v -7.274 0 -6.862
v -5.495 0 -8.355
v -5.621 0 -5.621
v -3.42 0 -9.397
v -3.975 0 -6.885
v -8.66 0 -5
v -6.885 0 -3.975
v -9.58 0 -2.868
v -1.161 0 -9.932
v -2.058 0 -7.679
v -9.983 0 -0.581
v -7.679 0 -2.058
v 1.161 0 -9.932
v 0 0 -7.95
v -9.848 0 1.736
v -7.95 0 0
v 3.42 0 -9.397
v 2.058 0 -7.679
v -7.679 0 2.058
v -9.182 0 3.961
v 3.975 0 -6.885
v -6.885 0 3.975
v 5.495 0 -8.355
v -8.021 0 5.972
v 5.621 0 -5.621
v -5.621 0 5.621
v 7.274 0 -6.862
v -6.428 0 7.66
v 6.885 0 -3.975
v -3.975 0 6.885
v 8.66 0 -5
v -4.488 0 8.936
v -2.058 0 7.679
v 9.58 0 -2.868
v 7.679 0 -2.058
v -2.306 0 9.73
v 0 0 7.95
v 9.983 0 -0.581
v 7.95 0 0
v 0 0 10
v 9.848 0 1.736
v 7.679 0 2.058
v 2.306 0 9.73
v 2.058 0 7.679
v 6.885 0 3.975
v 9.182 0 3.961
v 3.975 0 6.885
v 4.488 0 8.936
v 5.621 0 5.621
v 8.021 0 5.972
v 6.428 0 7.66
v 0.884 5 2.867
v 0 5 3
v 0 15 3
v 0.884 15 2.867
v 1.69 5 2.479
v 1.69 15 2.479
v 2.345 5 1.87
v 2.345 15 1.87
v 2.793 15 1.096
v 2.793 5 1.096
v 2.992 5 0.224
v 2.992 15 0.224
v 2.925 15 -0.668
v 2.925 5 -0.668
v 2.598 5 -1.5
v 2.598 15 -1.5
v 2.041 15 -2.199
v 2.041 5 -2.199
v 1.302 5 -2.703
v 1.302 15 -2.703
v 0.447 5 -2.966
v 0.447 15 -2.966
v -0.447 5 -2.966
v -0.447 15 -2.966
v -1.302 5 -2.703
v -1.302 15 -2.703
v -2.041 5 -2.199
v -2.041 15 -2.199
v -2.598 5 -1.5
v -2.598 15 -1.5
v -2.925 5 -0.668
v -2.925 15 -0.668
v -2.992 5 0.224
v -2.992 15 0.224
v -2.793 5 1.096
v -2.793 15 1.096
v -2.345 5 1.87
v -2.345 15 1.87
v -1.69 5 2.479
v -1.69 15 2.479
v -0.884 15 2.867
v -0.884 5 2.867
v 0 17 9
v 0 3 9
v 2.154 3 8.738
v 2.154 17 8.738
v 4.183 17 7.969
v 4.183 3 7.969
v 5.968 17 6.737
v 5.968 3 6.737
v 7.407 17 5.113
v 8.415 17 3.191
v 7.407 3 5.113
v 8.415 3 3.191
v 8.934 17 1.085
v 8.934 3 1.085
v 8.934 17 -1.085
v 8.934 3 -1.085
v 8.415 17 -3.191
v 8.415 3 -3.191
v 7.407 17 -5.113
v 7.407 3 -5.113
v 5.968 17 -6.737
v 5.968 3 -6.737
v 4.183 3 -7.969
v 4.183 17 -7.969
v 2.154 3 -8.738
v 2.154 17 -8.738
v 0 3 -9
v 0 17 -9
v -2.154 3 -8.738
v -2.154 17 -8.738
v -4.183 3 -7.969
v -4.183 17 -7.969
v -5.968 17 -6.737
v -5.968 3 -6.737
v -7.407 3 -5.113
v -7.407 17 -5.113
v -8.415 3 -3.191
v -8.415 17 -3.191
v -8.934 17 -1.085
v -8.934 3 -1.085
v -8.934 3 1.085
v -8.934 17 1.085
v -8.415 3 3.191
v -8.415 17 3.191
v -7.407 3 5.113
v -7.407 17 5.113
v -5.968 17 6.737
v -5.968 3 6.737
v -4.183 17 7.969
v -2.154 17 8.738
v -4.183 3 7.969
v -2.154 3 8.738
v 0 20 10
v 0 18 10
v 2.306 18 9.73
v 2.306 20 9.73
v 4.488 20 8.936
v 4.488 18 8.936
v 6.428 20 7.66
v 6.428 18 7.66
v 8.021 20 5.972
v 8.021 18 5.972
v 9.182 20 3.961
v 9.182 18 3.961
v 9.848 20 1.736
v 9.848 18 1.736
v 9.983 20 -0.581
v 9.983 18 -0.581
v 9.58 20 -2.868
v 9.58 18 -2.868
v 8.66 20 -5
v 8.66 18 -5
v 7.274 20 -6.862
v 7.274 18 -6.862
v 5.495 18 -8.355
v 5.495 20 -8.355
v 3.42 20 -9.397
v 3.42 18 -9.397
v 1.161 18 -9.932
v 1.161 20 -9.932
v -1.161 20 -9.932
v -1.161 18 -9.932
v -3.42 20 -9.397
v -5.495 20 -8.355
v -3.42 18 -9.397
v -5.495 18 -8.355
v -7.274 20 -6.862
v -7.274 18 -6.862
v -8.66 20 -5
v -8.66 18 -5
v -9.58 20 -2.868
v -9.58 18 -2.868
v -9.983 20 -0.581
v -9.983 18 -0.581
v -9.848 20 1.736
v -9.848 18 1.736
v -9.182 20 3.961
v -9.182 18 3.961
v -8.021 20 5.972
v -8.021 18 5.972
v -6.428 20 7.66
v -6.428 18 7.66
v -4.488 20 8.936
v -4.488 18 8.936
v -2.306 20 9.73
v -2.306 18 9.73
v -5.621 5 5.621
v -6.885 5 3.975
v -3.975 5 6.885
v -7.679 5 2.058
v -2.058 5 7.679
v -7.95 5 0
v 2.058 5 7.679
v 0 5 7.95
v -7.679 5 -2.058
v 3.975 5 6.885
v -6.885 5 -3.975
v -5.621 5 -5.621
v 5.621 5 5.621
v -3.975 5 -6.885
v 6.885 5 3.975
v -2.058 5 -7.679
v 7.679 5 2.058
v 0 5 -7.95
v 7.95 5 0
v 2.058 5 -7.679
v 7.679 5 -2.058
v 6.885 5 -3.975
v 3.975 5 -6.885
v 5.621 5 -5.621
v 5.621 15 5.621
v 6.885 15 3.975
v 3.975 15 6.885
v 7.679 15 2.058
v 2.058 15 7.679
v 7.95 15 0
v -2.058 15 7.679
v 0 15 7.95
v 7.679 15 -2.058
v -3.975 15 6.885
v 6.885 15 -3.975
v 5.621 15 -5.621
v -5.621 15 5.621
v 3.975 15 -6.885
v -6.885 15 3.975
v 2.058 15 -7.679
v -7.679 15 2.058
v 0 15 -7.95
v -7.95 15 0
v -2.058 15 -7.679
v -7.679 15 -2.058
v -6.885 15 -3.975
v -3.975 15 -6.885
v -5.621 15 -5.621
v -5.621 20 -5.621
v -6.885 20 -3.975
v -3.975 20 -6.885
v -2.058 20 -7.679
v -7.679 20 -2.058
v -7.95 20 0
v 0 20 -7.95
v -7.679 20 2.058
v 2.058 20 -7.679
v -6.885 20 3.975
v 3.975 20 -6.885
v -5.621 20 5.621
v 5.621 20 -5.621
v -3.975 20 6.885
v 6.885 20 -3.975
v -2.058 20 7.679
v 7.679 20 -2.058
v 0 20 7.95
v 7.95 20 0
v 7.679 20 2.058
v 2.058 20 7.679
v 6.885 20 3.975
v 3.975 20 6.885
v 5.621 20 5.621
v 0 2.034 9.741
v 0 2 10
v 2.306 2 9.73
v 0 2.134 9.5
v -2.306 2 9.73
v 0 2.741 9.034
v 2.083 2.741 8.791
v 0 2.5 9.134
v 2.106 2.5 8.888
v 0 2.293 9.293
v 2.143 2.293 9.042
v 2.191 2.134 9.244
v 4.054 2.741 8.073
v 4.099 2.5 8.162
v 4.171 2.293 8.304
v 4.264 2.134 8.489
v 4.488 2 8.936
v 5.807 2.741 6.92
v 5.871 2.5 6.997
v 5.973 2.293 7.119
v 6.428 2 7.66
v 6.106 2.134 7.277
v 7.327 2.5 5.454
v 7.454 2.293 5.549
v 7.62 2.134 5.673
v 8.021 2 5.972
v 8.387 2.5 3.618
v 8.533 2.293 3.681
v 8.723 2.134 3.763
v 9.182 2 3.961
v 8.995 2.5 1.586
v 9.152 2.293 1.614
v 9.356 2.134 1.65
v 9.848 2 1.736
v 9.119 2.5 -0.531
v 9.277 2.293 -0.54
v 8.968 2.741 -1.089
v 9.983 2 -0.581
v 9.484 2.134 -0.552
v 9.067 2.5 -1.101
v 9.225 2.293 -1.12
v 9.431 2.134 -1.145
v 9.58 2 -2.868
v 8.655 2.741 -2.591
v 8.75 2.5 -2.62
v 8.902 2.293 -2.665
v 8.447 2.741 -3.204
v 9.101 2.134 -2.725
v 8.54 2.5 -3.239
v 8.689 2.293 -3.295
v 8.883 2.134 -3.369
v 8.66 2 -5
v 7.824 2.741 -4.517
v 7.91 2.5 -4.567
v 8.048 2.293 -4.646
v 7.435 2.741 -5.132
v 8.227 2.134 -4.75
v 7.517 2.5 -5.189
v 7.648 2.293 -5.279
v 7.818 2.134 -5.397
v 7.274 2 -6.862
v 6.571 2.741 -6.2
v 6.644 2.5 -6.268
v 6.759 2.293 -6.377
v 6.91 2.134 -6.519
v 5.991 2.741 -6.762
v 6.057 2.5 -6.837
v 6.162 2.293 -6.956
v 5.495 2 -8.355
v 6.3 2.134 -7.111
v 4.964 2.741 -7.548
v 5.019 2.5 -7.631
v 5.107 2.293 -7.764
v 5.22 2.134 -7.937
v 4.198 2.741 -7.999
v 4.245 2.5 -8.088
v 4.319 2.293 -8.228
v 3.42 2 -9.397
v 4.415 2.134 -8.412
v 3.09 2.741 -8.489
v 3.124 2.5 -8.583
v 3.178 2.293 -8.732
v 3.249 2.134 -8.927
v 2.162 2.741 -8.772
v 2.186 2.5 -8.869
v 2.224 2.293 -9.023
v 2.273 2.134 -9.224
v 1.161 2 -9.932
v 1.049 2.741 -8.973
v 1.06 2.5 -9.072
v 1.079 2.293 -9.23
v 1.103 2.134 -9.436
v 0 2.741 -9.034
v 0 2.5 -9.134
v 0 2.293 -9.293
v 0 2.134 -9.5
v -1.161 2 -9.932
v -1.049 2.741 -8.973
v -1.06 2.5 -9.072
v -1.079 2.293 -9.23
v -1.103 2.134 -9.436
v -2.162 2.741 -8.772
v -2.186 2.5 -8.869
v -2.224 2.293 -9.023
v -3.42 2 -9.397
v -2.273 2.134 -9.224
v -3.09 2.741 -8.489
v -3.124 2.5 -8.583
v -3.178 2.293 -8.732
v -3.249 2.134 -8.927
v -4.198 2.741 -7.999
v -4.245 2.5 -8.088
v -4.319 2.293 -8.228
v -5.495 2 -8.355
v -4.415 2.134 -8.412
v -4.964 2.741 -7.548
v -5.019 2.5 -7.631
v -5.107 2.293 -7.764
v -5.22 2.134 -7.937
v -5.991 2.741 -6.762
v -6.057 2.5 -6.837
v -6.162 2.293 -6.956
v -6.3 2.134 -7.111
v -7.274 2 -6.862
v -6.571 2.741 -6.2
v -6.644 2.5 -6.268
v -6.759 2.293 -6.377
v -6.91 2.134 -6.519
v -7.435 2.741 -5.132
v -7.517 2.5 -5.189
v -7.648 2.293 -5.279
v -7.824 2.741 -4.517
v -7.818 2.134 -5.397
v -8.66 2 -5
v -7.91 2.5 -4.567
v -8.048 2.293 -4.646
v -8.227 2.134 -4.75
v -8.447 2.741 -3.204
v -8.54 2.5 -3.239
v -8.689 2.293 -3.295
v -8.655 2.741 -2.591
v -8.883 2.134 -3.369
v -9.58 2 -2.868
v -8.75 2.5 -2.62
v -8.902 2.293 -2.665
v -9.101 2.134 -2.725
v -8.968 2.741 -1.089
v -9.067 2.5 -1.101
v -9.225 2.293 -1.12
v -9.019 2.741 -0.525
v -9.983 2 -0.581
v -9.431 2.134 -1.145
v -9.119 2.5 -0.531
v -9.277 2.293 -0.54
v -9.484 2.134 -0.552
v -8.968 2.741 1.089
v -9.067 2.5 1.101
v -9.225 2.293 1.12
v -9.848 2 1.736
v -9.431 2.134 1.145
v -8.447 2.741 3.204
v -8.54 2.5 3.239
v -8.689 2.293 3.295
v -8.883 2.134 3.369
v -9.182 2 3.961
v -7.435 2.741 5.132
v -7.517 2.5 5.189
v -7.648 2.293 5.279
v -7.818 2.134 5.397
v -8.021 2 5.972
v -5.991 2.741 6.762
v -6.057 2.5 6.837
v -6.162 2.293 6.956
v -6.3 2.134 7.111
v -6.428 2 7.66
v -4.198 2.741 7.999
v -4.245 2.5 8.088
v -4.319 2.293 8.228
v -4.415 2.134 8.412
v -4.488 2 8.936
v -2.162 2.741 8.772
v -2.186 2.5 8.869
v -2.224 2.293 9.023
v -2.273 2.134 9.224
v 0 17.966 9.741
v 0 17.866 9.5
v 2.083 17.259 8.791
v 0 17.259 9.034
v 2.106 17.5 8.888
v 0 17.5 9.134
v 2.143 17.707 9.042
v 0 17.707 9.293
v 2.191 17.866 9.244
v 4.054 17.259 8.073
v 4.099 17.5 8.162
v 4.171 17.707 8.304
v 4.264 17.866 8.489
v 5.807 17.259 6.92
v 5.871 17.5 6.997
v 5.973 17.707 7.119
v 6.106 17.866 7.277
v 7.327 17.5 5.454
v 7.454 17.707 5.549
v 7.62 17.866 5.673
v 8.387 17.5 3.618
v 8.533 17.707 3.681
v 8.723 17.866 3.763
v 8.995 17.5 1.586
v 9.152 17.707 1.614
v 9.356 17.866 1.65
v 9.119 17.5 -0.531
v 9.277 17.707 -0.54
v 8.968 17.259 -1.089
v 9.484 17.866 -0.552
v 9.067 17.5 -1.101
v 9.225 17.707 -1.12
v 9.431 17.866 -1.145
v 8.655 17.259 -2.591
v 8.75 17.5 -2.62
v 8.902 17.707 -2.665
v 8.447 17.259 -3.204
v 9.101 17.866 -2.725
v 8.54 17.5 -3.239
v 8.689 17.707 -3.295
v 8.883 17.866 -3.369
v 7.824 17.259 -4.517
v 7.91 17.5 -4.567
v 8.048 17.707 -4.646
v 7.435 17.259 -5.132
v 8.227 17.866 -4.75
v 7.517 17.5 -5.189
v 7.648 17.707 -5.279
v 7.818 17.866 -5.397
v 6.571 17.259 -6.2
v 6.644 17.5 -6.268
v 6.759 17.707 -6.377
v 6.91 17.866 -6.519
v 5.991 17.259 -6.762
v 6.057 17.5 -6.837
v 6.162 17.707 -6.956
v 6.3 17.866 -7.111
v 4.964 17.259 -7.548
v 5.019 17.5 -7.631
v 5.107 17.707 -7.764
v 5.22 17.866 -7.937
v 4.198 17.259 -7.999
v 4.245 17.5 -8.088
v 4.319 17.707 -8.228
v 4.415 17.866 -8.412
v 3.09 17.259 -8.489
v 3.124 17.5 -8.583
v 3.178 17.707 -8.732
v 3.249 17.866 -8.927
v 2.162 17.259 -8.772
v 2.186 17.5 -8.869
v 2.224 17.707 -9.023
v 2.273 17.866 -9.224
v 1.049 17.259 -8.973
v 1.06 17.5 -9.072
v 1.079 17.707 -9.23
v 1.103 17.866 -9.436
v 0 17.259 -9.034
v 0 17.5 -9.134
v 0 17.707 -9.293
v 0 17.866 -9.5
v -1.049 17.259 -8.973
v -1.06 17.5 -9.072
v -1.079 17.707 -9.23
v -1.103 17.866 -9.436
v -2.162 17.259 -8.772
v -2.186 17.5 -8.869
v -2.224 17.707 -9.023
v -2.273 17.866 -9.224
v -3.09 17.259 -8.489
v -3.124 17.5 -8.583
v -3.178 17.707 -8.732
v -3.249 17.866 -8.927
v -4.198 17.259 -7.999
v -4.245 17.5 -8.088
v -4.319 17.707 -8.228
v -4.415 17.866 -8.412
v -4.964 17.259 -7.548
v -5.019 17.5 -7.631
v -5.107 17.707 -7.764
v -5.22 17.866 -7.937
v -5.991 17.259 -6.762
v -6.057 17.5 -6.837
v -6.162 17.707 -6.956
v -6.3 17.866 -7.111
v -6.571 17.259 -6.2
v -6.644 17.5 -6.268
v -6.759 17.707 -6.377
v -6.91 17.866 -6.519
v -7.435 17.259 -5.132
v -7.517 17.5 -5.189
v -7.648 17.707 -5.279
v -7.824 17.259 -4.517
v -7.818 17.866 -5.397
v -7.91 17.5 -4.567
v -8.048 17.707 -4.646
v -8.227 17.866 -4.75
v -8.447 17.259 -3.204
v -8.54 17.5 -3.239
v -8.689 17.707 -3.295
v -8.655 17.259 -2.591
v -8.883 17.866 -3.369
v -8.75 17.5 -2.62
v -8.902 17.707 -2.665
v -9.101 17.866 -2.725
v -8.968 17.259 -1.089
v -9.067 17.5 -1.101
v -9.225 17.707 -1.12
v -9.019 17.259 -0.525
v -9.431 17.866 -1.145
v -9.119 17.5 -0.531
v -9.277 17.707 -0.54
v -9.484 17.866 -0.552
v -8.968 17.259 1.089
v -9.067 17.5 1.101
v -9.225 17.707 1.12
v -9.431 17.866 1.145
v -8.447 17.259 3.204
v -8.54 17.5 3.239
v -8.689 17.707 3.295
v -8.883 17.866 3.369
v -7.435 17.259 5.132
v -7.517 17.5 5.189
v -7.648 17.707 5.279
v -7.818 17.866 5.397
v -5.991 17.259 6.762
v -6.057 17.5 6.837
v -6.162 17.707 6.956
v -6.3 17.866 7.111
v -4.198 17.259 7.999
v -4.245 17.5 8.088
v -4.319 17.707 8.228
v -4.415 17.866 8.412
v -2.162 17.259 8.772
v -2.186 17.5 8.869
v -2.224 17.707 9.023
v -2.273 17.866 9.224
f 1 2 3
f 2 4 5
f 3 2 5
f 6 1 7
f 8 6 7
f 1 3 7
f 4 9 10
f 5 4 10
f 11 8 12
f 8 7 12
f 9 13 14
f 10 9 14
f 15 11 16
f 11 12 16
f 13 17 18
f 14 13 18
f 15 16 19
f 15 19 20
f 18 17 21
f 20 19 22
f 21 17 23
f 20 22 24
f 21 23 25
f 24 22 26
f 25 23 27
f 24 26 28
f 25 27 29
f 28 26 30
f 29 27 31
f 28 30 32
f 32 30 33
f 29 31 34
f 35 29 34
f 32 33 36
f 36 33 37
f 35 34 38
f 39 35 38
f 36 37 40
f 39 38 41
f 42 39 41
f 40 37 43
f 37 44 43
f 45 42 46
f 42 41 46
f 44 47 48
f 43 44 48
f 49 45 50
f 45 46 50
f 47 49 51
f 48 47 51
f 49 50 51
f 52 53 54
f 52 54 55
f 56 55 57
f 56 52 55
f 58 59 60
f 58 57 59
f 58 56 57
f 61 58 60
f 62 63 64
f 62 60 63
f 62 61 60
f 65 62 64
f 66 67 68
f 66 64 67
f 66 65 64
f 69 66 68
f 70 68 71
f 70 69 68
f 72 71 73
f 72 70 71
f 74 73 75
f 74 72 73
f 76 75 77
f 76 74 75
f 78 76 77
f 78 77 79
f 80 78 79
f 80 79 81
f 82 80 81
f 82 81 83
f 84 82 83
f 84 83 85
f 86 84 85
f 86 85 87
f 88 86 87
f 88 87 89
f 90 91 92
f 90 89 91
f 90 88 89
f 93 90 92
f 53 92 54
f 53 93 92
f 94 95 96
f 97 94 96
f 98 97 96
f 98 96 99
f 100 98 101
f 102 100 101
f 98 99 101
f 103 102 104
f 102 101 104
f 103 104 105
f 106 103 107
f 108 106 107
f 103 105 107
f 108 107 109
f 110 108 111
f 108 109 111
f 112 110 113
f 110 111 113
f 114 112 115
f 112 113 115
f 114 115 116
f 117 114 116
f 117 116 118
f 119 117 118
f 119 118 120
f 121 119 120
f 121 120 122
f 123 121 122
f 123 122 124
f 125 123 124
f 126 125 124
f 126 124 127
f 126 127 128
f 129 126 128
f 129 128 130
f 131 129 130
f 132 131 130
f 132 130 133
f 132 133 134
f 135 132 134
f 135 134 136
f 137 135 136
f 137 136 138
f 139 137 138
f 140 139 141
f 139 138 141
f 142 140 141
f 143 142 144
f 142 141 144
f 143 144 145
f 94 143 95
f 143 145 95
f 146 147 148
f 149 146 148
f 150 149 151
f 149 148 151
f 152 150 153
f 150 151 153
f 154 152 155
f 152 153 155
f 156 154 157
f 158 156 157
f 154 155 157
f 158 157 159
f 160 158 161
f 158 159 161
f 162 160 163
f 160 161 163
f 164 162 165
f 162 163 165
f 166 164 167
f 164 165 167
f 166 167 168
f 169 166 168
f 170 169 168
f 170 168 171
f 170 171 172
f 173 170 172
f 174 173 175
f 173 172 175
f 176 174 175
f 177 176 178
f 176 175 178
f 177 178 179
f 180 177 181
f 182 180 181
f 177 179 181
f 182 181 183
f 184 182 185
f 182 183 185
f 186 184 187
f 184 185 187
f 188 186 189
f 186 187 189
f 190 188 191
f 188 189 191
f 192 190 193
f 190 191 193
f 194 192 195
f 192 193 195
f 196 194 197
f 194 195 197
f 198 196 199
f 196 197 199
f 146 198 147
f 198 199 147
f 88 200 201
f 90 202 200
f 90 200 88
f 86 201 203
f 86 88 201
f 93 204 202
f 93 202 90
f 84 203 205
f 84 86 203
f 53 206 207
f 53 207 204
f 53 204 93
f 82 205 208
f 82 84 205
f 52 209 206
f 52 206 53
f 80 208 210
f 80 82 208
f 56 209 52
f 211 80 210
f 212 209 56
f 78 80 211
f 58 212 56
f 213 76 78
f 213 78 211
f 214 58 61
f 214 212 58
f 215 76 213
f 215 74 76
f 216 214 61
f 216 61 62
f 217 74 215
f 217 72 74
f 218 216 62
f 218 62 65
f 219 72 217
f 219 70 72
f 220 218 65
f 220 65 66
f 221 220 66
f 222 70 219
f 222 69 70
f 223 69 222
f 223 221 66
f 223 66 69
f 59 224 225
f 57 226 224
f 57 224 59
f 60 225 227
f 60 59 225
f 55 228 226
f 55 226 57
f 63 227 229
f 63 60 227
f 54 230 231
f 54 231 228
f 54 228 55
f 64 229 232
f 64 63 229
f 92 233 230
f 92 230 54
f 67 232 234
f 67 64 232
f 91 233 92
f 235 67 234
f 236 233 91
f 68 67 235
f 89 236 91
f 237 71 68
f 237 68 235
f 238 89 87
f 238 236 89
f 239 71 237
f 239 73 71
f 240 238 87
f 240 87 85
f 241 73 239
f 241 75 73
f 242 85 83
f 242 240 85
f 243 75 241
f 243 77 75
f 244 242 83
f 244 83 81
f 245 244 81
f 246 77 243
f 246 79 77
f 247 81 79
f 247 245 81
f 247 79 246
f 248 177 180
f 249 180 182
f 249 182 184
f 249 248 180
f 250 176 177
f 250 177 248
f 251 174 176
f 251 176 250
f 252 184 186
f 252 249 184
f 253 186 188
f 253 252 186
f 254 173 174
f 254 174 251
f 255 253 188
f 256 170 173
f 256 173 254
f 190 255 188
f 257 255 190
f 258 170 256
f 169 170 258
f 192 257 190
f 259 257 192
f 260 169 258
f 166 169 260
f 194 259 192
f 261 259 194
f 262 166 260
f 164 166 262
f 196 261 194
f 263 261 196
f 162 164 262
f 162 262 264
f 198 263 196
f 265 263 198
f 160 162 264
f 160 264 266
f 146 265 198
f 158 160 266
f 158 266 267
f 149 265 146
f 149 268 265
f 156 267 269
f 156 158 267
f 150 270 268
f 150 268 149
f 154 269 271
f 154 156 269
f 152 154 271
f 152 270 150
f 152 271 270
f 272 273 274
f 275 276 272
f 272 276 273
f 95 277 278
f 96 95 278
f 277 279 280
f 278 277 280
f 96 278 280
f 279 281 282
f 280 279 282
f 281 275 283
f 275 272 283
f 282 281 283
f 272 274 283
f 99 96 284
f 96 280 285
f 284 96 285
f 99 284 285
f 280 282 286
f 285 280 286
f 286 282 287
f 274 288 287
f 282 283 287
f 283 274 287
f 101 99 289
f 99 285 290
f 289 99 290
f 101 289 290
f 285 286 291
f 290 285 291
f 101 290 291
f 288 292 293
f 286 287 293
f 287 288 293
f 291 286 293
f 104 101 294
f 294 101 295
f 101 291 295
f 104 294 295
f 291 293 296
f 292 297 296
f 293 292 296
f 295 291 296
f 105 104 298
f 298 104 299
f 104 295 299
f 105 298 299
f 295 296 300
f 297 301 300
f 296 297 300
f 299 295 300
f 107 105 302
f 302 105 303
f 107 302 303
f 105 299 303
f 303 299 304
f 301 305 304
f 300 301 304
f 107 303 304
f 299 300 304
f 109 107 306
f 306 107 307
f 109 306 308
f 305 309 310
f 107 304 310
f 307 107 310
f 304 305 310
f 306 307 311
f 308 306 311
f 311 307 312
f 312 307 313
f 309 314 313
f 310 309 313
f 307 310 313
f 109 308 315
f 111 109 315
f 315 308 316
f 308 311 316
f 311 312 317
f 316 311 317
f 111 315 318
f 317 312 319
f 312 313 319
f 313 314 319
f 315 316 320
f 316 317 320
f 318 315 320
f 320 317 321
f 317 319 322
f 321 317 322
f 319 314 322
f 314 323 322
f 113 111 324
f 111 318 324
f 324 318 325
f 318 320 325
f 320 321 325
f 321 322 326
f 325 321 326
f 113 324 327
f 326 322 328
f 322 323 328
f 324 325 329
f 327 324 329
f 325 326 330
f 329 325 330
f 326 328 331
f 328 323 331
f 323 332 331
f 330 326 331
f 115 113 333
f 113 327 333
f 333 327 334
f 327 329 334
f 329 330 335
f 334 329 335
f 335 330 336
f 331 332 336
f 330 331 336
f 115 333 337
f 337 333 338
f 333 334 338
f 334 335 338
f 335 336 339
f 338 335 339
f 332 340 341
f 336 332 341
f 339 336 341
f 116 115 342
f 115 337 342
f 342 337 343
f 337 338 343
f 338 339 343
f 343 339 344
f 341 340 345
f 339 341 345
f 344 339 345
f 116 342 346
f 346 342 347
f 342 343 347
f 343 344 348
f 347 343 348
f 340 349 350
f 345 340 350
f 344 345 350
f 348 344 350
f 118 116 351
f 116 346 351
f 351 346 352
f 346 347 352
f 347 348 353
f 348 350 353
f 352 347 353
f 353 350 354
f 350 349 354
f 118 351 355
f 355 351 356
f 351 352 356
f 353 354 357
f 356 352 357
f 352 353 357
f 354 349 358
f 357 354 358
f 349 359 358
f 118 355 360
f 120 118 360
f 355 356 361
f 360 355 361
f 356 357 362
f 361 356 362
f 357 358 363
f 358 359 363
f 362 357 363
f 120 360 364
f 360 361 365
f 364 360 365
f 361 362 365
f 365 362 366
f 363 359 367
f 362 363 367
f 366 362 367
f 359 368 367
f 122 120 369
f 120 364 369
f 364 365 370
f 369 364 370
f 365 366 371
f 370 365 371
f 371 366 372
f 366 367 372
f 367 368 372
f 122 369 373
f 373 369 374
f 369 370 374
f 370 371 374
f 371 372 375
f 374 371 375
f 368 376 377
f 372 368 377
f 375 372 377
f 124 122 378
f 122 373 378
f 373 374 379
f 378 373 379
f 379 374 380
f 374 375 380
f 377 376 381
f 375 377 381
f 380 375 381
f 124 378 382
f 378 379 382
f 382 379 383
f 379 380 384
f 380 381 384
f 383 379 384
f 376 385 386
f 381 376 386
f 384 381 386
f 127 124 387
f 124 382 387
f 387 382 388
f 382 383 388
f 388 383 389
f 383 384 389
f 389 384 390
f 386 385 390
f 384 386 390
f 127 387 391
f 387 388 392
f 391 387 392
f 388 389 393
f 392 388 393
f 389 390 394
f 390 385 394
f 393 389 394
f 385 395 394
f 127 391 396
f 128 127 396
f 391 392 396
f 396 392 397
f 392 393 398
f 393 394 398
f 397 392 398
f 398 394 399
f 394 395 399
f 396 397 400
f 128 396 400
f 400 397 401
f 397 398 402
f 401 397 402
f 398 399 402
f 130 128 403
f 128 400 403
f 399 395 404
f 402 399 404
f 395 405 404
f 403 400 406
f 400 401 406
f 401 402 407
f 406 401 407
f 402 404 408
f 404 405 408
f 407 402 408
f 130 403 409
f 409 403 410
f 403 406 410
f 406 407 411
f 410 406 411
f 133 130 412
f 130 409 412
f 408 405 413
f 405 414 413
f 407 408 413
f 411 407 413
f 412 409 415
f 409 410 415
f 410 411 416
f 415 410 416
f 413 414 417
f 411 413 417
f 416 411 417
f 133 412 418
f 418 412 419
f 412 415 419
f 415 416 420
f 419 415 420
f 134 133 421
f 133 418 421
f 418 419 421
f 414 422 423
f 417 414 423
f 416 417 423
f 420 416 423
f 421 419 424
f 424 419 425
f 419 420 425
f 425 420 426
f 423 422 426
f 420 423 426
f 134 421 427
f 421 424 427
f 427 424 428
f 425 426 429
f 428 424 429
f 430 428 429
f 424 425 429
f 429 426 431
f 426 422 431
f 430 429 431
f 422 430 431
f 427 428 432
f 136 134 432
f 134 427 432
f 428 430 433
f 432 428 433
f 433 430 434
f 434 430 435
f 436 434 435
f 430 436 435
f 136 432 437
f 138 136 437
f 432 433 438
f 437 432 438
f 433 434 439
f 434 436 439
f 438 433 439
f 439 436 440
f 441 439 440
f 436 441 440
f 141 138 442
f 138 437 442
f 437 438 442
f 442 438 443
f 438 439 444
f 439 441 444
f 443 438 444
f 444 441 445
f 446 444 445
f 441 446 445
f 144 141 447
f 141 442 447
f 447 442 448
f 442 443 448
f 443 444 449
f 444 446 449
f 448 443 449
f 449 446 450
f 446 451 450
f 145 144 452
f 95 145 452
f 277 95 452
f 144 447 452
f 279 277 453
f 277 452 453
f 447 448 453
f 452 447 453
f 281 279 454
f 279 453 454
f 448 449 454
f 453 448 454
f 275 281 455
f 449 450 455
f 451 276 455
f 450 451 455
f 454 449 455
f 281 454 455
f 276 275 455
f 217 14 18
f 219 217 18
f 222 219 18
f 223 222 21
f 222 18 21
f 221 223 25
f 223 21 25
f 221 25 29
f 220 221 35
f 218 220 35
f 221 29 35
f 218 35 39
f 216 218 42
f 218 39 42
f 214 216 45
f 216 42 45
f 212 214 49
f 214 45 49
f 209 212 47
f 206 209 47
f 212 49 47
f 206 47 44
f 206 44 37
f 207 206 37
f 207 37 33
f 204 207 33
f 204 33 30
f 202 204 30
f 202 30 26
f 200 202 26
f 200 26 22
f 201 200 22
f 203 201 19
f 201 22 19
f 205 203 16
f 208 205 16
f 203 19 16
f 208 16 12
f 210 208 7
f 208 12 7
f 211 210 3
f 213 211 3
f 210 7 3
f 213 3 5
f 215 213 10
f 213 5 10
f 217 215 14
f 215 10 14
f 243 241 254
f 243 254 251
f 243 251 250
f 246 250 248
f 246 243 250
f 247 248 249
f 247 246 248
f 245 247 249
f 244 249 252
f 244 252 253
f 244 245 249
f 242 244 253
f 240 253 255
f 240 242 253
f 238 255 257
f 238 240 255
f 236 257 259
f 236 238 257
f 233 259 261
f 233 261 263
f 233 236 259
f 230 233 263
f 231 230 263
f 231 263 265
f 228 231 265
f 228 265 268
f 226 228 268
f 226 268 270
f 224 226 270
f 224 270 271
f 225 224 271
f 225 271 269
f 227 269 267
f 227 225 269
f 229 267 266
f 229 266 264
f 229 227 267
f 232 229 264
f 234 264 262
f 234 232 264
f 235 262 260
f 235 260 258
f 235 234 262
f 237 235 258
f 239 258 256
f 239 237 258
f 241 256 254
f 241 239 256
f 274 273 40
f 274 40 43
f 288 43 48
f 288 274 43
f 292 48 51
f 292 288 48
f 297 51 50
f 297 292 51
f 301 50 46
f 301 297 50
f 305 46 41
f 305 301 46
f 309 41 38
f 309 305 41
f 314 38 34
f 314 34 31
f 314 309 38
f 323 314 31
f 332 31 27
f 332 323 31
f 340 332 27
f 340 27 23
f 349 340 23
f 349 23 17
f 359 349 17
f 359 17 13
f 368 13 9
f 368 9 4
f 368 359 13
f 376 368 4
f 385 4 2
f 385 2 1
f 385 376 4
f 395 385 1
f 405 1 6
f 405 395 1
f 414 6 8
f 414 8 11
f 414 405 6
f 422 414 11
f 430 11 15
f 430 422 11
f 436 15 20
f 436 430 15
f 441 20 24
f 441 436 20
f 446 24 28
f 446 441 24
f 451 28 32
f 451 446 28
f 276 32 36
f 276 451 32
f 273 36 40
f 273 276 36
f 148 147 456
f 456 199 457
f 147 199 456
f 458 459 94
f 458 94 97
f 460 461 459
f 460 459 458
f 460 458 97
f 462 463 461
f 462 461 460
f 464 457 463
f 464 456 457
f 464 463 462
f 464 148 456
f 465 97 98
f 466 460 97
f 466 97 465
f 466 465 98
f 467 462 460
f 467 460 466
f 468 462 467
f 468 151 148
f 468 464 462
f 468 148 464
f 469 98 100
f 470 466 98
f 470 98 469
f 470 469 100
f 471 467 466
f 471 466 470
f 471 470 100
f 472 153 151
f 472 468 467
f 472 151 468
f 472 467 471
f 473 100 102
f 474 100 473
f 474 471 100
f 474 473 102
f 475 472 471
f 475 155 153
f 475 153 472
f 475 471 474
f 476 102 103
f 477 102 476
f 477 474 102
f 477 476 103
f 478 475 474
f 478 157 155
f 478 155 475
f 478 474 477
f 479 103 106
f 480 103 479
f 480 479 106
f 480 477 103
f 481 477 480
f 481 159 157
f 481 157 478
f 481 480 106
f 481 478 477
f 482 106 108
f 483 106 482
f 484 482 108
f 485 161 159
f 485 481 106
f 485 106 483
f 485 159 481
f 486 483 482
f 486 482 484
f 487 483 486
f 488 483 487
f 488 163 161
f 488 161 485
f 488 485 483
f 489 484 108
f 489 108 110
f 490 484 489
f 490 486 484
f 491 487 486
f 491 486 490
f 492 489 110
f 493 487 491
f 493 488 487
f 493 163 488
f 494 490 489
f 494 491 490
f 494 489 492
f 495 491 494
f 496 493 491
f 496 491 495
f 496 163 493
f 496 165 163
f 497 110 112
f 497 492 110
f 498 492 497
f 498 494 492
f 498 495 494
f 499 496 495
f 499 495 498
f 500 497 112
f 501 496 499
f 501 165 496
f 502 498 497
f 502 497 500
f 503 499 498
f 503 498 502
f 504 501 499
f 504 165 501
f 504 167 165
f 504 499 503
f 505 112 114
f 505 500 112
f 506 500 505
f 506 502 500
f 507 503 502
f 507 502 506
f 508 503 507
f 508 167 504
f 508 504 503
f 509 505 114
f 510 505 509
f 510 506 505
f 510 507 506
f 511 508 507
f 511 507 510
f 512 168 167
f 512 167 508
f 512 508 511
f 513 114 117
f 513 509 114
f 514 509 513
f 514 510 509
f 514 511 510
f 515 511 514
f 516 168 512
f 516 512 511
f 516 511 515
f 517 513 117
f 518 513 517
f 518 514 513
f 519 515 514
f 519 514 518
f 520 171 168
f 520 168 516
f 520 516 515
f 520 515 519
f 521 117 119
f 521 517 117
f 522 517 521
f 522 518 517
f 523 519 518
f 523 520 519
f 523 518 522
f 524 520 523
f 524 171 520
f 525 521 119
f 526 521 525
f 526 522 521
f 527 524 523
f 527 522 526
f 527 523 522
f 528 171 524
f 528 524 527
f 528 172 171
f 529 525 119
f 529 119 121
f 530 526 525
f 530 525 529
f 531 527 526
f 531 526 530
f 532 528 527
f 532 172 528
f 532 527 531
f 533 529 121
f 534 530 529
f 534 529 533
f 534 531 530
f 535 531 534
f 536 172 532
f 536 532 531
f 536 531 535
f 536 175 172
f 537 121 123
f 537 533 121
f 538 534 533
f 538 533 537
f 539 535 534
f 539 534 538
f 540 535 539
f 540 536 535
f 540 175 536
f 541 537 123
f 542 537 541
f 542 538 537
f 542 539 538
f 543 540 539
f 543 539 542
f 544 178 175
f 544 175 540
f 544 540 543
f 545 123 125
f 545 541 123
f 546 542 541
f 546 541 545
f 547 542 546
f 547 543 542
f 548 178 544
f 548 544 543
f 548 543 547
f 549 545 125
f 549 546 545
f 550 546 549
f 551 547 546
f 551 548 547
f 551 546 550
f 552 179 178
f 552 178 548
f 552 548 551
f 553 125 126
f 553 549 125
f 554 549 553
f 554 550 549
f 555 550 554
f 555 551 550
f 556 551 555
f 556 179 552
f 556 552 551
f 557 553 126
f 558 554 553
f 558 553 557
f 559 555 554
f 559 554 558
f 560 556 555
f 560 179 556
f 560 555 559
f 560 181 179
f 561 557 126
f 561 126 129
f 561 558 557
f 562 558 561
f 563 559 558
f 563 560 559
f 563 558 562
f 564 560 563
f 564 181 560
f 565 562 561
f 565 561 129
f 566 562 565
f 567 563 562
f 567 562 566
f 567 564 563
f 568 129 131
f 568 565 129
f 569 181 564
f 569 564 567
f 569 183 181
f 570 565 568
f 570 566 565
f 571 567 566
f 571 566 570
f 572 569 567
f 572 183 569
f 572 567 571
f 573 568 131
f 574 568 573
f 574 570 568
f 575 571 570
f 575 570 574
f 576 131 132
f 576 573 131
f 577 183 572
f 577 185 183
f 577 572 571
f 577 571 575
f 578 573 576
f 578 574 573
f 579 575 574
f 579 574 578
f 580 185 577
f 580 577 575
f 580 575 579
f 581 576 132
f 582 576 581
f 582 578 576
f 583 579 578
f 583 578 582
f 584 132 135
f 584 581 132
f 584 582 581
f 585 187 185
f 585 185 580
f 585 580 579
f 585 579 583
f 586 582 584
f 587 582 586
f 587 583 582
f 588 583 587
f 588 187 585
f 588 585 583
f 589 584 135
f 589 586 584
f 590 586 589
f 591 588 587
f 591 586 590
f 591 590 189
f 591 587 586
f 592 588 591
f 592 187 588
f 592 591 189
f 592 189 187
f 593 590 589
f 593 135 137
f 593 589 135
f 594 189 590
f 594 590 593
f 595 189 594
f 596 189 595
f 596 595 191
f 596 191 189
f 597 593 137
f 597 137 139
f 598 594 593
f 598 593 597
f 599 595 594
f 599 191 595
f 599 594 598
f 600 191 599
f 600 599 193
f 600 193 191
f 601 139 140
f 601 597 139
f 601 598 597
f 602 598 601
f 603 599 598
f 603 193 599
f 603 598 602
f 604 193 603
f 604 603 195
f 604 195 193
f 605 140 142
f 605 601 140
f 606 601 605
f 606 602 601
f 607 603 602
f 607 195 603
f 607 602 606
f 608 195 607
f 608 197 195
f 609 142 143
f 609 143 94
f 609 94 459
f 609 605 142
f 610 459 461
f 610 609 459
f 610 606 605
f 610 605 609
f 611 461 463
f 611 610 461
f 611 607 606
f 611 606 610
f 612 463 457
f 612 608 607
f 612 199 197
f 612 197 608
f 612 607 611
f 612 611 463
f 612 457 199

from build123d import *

# Parameters (mm, degrees)
SKETCH_1_R          = 8
SKETCH_1_R_2        = 3
EXTRUDE_1_DEPTH     = 20
EXTRUDE_START       = -20
SKETCH_2_R          = 9
SKETCH_2_R_2        = 3
EXTRUDE_2_DEPTH     = 20
EXTRUDE_START_2     = -2
SKETCH_3_R          = 10
SKETCH_3_R_2        = 9
EXTRUDE_3_DEPTH     = 2
FILLET_1_R          = 1
FILLET_2_R          = 1
SKETCH_4_R          = 7.95
CUT_EXTRUDE_1_DEPTH = 5
CUT_EXTRUDE_START   = -5
SKETCH_5_R          = 7.95
CUT_EXTRUDE_2_DEPTH = 5


with BuildPart() as part:
    # 草图1 → 凸台-拉伸1 (new body)
    with BuildSketch(Plane(origin=(0, 0, 0), x_dir=(1, 0, 0), z_dir=(0, 1, 0))):
        with Locations(Location((0, 0, 0), (0, 0, 270))):
            Circle(SKETCH_1_R)
        with Locations(Location((0, 0, 0), (0, 0, 270))):
            Circle(SKETCH_1_R_2, mode=Mode.SUBTRACT)
    extrude(amount=EXTRUDE_1_DEPTH)

    # 草图2 → 凸台-拉伸2 (add)
    with BuildSketch(Plane(origin=(0, 20, 0), x_dir=(1, 0, 0), z_dir=(0, 1, 0)).offset(EXTRUDE_START)):
        with Locations(Location((0, 0, 0), (0, 0, 270))):
            Circle(SKETCH_2_R)
        with Locations(Location((0, 0, 0), (0, 0, 270))):
            Circle(SKETCH_2_R_2, mode=Mode.SUBTRACT)
    extrude(amount=EXTRUDE_2_DEPTH)

    # 草图3 → 凸台-拉伸3 (add)
    with BuildSketch(Plane(origin=(0, 20, 0), x_dir=(1, 0, 0), z_dir=(0, 1, 0)).offset(EXTRUDE_START_2)):
        with Locations(Location((0, 0, 0), (0, 0, 270))):
            Circle(SKETCH_3_R)
        with Locations(Location((0, 0, 0), (0, 0, 270))):
            Circle(SKETCH_3_R_2, mode=Mode.SUBTRACT)
    extrude_3 = extrude(amount=EXTRUDE_3_DEPTH)

    # 镜向1: 凸台-拉伸3 across plane
    add(extrude_3.mirror(Plane(origin=(0, 10, 0), x_dir=(0, 0, 1), z_dir=(0, -1, 0))))

    # 圆角1
    fillet_1_edges = [part.edges().sort_by_distance(p)[0] for p in [
        (0, 18, -9),
    ]]
    fillet(fillet_1_edges, radius=FILLET_1_R - 0.0001)  # a hair under: the kernel refuses the full size

    # 圆角2
    fillet_2_edges = [part.edges().sort_by_distance(p)[0] for p in [
        (0, 2, -9),
    ]]
    fillet(fillet_2_edges, radius=FILLET_2_R - 0.0001)  # a hair under: the kernel refuses the full size

    # 草图4 → 切除-拉伸1 (cut)
    with BuildSketch(Plane.XZ):
        with Locations(Location((0, 0, 0), (0, 0, 270))):
            Circle(SKETCH_4_R)
    extrude(amount=-CUT_EXTRUDE_1_DEPTH, mode=Mode.SUBTRACT)

    # 草图5 → 切除-拉伸2 (cut)
    with BuildSketch(Plane(origin=(0, 20, 0), x_dir=(1, 0, 0), z_dir=(0, 1, 0)).offset(CUT_EXTRUDE_START)):
        with Locations(Location((0, 0, 0), (0, 0, 90))):
            Circle(SKETCH_5_R)
    extrude(amount=CUT_EXTRUDE_2_DEPTH, mode=Mode.SUBTRACT)


solid = part.part
